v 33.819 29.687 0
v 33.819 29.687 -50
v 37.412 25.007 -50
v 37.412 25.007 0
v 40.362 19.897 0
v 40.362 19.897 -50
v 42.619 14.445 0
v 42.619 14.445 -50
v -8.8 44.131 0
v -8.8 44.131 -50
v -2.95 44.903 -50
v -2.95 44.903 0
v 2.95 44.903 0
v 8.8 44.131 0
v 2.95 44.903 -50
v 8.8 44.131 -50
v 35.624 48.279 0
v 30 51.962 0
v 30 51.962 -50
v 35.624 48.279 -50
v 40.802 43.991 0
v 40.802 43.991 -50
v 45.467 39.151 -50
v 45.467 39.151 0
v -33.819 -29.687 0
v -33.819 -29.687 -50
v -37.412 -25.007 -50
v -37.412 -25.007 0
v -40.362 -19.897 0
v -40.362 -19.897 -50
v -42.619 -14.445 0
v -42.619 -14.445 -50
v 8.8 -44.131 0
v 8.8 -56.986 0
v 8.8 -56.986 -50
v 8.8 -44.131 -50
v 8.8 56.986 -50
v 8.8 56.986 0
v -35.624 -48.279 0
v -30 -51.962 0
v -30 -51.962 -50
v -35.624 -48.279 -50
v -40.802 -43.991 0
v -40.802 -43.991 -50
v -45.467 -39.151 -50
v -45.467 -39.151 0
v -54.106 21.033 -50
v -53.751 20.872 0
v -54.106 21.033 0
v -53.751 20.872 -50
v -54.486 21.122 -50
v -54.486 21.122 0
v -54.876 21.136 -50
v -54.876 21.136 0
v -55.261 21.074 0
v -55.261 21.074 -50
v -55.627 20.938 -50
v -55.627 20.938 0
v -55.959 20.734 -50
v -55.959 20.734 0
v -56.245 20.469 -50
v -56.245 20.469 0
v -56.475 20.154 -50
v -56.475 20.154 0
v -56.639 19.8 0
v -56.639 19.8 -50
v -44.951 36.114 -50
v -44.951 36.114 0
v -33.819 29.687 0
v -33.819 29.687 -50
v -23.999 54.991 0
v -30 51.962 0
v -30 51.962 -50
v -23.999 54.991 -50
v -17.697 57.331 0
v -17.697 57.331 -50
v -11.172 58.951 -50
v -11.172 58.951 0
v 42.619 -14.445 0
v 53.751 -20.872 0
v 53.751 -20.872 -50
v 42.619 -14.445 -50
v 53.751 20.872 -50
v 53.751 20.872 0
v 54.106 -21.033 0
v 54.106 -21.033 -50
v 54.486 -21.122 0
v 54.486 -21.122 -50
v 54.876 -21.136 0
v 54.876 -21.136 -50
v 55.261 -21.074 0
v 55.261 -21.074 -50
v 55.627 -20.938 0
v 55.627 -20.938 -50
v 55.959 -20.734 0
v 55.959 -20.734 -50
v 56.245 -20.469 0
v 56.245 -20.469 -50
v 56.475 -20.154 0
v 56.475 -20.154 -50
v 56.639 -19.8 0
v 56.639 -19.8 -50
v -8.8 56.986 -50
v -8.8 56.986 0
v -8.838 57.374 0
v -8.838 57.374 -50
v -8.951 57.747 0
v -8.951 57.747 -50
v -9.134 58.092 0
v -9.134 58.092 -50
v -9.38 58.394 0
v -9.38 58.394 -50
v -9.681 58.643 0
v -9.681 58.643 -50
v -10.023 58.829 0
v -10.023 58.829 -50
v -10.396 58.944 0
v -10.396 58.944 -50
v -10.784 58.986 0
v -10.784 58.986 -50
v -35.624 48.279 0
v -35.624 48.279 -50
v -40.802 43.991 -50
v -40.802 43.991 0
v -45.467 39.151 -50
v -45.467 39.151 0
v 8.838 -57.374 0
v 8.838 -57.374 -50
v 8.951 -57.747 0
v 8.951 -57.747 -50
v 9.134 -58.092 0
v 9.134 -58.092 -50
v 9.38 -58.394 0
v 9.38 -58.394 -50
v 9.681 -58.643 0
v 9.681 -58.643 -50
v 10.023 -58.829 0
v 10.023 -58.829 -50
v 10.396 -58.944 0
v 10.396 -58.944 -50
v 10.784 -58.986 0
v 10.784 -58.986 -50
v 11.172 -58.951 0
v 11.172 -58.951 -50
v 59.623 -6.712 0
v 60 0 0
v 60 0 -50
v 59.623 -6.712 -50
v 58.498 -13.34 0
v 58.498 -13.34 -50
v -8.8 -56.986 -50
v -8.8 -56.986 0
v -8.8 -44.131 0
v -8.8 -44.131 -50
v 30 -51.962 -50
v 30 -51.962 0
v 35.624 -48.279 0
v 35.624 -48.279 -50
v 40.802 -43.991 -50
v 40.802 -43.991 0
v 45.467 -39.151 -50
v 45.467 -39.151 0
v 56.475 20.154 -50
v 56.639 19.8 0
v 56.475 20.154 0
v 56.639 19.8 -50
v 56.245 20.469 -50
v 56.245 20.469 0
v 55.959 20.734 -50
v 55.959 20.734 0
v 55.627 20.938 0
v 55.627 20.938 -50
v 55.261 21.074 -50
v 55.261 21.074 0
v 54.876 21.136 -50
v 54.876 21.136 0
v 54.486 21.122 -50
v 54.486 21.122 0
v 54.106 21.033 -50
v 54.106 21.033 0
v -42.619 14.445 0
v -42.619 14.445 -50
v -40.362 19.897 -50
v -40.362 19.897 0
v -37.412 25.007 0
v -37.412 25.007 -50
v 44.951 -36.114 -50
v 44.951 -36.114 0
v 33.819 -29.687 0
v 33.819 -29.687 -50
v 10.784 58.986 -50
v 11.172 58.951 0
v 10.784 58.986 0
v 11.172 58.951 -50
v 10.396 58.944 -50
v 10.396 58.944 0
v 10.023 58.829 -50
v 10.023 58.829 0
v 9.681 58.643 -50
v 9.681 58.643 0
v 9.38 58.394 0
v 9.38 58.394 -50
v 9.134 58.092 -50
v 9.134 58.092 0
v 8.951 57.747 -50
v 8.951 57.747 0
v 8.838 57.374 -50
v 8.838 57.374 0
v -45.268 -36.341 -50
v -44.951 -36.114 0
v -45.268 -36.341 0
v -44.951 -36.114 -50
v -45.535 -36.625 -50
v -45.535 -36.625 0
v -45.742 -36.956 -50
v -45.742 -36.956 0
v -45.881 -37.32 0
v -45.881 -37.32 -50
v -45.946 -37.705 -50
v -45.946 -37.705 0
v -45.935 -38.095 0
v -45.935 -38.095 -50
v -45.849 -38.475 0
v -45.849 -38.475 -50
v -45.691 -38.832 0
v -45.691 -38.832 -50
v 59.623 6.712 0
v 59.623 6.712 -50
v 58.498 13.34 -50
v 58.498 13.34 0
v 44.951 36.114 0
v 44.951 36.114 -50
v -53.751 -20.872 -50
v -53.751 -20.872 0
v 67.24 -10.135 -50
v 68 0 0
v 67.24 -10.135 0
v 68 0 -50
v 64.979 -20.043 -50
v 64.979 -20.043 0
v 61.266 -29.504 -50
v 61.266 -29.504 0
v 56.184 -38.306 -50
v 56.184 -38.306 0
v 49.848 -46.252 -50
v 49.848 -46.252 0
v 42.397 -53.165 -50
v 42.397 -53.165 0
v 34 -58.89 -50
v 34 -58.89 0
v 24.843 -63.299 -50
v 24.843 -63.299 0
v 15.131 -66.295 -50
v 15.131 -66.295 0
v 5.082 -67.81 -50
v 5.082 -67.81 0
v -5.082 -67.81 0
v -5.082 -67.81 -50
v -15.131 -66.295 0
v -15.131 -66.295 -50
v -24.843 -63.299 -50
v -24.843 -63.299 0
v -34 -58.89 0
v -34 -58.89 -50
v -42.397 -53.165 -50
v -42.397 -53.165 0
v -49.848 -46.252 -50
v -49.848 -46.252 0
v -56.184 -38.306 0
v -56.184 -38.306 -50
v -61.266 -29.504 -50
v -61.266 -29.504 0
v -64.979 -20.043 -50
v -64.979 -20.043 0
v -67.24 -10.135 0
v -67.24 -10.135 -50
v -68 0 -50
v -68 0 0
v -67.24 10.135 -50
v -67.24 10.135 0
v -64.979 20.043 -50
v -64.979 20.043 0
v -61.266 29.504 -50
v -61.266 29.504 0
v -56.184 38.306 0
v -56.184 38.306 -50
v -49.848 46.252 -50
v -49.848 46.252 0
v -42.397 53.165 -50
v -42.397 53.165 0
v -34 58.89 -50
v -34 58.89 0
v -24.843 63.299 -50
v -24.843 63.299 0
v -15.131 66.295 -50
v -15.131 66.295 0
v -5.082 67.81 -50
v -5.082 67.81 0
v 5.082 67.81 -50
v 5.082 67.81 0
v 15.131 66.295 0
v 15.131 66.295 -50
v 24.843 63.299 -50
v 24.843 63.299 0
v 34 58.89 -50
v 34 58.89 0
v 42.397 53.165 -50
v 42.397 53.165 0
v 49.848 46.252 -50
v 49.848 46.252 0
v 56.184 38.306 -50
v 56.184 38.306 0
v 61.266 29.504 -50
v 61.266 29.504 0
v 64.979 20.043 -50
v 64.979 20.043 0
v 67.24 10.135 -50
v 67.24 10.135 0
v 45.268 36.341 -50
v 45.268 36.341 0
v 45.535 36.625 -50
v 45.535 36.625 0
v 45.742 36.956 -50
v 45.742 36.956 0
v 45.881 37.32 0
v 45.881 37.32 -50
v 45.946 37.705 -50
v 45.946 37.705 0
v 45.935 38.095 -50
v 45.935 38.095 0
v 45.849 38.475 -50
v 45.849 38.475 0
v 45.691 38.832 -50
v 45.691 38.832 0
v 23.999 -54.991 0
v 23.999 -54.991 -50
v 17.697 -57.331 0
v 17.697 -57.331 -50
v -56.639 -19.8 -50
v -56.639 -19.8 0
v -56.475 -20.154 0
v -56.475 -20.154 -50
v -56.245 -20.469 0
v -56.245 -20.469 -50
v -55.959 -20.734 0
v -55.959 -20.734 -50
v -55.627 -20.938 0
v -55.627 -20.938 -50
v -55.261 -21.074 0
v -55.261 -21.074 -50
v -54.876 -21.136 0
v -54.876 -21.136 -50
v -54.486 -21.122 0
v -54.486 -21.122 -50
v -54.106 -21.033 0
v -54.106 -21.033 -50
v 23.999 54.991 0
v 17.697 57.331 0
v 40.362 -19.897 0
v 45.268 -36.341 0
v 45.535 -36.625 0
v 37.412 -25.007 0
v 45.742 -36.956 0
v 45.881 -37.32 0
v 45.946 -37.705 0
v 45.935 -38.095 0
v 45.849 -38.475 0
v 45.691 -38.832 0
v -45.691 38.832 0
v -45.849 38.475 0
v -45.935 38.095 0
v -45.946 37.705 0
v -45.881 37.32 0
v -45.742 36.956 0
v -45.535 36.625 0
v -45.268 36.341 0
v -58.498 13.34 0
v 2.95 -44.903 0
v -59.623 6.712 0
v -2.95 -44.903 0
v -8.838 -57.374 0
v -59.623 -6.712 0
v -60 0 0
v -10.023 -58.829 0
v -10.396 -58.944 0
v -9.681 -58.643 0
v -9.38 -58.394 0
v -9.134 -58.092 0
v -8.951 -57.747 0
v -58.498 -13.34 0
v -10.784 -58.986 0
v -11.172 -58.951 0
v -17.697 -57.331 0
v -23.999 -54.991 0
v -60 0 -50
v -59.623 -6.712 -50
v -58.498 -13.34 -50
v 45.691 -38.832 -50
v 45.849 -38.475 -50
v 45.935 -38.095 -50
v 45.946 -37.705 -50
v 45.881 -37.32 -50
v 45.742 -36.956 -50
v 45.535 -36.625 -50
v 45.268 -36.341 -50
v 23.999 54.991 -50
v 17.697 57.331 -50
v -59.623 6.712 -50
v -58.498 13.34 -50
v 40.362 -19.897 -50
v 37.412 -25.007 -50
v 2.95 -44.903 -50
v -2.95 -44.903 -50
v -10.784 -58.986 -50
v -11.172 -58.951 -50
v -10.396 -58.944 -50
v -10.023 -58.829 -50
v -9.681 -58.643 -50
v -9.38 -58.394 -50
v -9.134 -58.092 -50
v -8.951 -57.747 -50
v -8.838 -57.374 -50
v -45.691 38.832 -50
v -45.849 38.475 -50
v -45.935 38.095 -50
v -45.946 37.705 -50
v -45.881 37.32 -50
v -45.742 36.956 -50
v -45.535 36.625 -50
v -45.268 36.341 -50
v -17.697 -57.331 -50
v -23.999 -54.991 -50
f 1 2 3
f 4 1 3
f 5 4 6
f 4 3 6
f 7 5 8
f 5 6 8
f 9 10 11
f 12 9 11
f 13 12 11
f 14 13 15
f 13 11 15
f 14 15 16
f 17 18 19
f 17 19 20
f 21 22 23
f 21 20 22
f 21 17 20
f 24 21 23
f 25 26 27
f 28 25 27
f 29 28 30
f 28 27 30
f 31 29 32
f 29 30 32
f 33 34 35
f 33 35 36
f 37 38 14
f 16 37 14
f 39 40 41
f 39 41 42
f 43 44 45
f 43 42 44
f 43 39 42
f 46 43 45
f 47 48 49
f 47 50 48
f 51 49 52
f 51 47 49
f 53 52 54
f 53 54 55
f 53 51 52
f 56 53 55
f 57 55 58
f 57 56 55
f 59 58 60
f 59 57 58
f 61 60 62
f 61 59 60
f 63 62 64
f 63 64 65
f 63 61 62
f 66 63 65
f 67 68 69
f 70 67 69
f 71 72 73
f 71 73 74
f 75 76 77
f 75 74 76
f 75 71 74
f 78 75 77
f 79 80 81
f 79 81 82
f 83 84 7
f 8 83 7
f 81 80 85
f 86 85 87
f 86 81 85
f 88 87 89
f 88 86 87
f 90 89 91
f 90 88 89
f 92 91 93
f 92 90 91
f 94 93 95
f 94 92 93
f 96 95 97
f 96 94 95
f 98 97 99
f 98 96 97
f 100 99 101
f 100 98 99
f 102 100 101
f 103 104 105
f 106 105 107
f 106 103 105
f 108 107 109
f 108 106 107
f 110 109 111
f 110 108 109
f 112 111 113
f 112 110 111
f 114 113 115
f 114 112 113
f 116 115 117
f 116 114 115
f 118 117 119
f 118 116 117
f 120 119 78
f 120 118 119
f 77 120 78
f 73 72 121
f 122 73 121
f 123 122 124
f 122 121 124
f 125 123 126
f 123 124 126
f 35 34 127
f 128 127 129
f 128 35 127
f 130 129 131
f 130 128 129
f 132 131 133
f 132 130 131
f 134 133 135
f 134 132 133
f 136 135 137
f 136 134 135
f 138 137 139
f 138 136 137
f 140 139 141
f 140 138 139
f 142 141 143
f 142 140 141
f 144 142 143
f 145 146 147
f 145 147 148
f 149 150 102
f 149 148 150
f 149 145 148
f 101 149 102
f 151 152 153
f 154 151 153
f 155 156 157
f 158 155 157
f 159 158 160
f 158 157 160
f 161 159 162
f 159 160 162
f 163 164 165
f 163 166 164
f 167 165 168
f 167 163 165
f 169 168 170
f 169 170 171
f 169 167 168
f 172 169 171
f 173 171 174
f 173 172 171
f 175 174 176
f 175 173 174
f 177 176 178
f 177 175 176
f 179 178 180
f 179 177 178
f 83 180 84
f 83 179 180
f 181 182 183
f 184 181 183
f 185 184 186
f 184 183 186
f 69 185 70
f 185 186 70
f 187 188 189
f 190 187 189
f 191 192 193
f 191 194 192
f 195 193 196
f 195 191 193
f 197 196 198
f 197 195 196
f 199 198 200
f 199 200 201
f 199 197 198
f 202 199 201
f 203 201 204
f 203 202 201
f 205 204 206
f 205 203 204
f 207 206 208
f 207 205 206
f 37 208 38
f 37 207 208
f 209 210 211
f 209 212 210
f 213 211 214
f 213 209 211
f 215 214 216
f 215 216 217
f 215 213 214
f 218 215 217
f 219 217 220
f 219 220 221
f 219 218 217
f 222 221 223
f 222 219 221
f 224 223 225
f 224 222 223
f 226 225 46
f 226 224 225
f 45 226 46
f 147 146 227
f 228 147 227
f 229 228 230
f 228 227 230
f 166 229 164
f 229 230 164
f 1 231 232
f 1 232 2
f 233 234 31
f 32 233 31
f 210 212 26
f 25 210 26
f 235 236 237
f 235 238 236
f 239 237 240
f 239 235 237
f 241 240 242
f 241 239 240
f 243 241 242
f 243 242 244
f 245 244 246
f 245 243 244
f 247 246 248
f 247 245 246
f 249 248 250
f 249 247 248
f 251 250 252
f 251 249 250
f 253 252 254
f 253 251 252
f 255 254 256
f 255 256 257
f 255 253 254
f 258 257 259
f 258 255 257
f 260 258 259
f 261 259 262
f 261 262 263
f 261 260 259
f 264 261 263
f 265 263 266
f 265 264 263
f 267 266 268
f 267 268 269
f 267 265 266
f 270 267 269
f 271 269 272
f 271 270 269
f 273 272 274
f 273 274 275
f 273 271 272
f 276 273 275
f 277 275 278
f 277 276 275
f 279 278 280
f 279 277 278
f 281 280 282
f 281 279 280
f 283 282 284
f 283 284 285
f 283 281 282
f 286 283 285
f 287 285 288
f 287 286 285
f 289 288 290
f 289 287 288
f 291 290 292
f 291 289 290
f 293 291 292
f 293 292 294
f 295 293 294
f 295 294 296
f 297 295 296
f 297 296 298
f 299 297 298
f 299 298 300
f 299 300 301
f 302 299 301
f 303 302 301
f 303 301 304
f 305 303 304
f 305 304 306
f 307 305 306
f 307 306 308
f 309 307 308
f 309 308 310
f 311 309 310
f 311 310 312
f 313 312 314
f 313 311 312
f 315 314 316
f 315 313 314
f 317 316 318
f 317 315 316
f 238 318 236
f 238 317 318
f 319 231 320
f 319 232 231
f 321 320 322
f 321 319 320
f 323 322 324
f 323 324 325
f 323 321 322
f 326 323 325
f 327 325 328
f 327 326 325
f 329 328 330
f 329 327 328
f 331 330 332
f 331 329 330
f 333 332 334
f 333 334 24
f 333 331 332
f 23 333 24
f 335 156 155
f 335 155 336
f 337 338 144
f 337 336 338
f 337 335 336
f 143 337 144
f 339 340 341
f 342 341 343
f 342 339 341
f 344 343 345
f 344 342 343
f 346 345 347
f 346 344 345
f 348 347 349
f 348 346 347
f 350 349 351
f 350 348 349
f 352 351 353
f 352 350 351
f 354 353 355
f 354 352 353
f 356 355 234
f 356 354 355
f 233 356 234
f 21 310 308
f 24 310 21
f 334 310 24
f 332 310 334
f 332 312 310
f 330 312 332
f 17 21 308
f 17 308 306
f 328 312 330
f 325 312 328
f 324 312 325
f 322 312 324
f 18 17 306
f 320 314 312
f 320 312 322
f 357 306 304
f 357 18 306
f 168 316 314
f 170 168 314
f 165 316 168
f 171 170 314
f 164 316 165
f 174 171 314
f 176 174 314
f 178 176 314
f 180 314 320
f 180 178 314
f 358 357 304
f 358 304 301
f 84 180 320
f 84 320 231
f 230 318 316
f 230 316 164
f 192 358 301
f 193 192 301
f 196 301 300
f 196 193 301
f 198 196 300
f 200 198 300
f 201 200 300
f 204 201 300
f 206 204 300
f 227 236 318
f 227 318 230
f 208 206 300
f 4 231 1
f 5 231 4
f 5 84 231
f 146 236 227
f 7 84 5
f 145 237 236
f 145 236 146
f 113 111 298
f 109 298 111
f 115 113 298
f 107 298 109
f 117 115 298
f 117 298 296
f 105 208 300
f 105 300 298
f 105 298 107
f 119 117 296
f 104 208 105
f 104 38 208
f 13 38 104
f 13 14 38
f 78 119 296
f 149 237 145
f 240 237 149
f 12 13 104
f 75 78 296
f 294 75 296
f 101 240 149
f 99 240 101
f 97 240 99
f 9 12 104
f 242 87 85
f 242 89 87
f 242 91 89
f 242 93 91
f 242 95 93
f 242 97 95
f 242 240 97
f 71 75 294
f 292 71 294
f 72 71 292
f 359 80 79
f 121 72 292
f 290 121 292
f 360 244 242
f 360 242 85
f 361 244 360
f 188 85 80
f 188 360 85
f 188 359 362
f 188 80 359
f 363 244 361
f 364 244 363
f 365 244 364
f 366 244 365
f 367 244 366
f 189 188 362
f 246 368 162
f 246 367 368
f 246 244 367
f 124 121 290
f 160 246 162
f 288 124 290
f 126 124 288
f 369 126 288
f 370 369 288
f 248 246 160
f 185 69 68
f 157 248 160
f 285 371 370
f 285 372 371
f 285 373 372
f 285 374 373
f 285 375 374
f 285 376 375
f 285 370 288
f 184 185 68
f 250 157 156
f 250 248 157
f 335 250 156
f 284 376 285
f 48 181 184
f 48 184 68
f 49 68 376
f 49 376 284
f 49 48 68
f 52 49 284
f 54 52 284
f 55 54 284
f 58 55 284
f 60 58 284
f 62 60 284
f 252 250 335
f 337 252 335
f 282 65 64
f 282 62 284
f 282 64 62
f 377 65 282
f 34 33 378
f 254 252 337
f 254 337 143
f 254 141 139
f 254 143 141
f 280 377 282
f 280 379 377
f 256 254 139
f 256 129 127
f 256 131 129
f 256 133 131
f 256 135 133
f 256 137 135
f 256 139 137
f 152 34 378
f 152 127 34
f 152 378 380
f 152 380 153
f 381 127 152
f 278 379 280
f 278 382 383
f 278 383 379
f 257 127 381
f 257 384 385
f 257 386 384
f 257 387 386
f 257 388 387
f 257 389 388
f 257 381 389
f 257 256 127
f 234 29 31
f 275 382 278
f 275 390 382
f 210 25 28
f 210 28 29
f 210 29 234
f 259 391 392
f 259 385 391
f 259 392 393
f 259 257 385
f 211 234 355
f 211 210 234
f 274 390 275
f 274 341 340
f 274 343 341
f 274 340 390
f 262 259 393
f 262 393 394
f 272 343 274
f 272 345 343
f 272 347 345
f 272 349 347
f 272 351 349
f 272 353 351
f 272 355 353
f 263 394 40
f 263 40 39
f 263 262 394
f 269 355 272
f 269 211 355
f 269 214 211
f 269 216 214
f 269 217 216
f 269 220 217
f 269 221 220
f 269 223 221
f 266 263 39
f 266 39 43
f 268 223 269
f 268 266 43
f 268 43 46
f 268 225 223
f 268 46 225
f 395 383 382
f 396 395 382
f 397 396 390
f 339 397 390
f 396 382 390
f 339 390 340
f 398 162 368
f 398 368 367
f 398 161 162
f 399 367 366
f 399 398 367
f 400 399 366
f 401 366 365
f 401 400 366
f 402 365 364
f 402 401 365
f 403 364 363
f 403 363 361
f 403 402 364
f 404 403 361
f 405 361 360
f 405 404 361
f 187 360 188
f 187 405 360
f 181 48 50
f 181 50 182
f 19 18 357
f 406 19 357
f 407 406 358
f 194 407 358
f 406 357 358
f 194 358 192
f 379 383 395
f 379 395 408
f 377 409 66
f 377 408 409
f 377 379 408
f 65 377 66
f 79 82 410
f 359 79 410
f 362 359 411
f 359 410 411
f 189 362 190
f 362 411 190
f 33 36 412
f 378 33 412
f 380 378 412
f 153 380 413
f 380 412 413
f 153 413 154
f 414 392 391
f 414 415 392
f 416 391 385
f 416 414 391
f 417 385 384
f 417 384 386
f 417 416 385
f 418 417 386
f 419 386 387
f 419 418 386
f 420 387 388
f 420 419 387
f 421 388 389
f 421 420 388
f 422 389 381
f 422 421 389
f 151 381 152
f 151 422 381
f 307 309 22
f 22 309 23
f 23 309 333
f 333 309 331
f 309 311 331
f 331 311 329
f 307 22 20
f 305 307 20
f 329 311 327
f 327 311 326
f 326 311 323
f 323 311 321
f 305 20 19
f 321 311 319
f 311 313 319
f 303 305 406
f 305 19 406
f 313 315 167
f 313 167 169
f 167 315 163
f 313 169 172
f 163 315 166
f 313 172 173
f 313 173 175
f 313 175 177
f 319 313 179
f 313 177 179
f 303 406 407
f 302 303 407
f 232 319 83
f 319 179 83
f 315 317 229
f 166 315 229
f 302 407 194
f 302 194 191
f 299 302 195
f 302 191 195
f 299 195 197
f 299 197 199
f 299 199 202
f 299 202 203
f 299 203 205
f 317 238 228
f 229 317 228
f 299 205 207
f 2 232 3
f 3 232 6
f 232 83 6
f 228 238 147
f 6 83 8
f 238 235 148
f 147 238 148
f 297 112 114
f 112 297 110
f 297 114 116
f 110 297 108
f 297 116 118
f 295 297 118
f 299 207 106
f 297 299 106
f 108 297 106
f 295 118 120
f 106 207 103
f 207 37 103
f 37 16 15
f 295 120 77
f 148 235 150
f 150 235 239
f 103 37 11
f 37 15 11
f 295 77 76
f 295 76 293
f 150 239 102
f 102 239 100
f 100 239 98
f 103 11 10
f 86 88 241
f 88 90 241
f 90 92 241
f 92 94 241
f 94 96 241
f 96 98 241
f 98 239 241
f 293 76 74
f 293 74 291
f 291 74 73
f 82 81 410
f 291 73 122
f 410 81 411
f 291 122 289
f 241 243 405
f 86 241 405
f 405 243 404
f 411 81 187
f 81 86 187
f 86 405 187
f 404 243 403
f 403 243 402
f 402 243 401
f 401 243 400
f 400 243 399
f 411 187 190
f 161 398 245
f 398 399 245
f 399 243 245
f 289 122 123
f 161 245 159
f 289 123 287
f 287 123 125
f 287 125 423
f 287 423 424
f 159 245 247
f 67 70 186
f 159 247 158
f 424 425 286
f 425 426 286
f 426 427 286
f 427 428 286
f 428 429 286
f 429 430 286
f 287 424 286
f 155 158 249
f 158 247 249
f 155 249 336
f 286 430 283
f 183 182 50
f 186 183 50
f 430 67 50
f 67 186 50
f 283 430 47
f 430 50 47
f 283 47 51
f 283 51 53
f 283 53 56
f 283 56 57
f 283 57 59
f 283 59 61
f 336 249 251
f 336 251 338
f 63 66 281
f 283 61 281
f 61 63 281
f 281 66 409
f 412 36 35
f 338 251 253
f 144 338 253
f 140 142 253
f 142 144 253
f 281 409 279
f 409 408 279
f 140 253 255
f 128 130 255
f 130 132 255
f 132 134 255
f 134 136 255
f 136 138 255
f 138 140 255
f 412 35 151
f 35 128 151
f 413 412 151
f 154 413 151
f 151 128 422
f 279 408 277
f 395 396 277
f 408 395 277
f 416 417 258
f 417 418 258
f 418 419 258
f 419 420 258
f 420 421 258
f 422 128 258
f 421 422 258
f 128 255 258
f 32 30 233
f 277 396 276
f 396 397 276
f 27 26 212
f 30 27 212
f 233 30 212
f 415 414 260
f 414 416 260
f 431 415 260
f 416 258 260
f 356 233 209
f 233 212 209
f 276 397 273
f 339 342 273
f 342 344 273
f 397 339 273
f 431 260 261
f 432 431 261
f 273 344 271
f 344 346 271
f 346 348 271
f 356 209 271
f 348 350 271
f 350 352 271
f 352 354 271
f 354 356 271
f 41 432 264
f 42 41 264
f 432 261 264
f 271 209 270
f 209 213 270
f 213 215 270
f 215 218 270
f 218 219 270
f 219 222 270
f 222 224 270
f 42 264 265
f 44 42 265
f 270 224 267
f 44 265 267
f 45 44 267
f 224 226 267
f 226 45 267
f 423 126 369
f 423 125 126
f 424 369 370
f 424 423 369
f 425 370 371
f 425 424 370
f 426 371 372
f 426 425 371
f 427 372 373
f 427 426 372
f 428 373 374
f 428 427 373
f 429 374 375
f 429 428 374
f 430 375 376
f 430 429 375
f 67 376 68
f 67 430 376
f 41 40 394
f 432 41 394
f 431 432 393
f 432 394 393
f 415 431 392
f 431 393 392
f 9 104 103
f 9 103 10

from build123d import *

# Parameters (mm, degrees)
SKETCH_1_W                       = 50
SKETCH_1_H                       = 23
CUT_EXTRUDE_1_DEPTH              = 109.388191239
FILLET_1_R                       = 2
PATTERN_CIRCULAR_1_COUNT         = 6
FILLET_1_OF_PATTERN_CIRCULAR_1_R = 2


with BuildPart() as part:
    # Эскиз1 → Повернуть1 (revolve)
    with BuildSketch(Plane(origin=(0, 0, 0), x_dir=(0, 0, -1), z_dir=(1, 0, 0)), mode=Mode.PRIVATE) as revolve_1_sk:
        with Locations((25, 56.5)):
            Rectangle(SKETCH_1_W, SKETCH_1_H)
    revolve(revolve_1_sk.sketch.rotate(Axis((0, 0, 0), (0, 0, -1)), 90), axis=Axis((0, 0, 0), (0, 0, -1)))

    # Эскиз2 → Вырез-Вытянуть1 (cut, through all)
    with BuildSketch(Plane.XY):
        with BuildLine():
            Line((-8.8, 59.351158371), (-8.8, 44.131168124))
            ThreePointArc((-8.8, 44.131168124), (-15.861240947, 42.112005837), (-22.5, 38.97114317))
            Line((-22.5, 38.97114317), (-30, 51.961524227))
            ThreePointArc((-30, 51.961524227), (-19.748713204, 56.65675888), (-8.8, 59.351158371))
        make_face()
        with BuildLine():
            Line((8.8, 59.351158371), (8.8, 44.131168124))
            ThreePointArc((8.8, 44.131168124), (15.861240947, 42.112005837), (22.5, 38.97114317))
            Line((22.5, 38.97114317), (30, 51.961524227))
            ThreePointArc((30, 51.961524227), (19.748713204, 56.65675888), (8.8, 59.351158371))
        make_face()
    cut_extrude_1 = extrude(amount=-CUT_EXTRUDE_1_DEPTH, mode=Mode.SUBTRACT)

    # Скругление1
    fillet_1_edges = [part.edges().sort_by_distance(p)[0] for p in [
        (-8.8, 59.351158371, -25),
        (8.8, 59.351158371, -25),
    ]]
    fillet(fillet_1_edges, radius=FILLET_1_R)

    # Круговой массив1: Вырез-Вытянуть1 ×6 about axis
    pattern_circular_1_axis = Axis((0, 0, 0), (0, 0, 1))
    for i in range(1, PATTERN_CIRCULAR_1_COUNT):
        add(cut_extrude_1.rotate(pattern_circular_1_axis, i * 360 / PATTERN_CIRCULAR_1_COUNT), mode=Mode.SUBTRACT)

    # Скругление1 of Круговой массив1
    fillet_1_of_pattern_circular_1_edges = [part.edges().sort_by_distance(p)[0] for p in [
        (-55.799610893, 22.054555632, -25),
        (-46.999610893, 37.296602739, -25),
        (-46.999610893, -37.296602739, -25),
        (-55.799610893, -22.054555632, -25),
        (8.8, -59.351158371, -25),
        (-8.8, -59.351158371, -25),
        (55.799610893, -22.054555632, -25),
        (46.999610893, -37.296602739, -25),
        (46.999610893, 37.296602739, -25),
        (55.799610893, 22.054555632, -25),
    ]]
    fillet(fillet_1_of_pattern_circular_1_edges, radius=FILLET_1_OF_PATTERN_CIRCULAR_1_R)


solid = part.part
